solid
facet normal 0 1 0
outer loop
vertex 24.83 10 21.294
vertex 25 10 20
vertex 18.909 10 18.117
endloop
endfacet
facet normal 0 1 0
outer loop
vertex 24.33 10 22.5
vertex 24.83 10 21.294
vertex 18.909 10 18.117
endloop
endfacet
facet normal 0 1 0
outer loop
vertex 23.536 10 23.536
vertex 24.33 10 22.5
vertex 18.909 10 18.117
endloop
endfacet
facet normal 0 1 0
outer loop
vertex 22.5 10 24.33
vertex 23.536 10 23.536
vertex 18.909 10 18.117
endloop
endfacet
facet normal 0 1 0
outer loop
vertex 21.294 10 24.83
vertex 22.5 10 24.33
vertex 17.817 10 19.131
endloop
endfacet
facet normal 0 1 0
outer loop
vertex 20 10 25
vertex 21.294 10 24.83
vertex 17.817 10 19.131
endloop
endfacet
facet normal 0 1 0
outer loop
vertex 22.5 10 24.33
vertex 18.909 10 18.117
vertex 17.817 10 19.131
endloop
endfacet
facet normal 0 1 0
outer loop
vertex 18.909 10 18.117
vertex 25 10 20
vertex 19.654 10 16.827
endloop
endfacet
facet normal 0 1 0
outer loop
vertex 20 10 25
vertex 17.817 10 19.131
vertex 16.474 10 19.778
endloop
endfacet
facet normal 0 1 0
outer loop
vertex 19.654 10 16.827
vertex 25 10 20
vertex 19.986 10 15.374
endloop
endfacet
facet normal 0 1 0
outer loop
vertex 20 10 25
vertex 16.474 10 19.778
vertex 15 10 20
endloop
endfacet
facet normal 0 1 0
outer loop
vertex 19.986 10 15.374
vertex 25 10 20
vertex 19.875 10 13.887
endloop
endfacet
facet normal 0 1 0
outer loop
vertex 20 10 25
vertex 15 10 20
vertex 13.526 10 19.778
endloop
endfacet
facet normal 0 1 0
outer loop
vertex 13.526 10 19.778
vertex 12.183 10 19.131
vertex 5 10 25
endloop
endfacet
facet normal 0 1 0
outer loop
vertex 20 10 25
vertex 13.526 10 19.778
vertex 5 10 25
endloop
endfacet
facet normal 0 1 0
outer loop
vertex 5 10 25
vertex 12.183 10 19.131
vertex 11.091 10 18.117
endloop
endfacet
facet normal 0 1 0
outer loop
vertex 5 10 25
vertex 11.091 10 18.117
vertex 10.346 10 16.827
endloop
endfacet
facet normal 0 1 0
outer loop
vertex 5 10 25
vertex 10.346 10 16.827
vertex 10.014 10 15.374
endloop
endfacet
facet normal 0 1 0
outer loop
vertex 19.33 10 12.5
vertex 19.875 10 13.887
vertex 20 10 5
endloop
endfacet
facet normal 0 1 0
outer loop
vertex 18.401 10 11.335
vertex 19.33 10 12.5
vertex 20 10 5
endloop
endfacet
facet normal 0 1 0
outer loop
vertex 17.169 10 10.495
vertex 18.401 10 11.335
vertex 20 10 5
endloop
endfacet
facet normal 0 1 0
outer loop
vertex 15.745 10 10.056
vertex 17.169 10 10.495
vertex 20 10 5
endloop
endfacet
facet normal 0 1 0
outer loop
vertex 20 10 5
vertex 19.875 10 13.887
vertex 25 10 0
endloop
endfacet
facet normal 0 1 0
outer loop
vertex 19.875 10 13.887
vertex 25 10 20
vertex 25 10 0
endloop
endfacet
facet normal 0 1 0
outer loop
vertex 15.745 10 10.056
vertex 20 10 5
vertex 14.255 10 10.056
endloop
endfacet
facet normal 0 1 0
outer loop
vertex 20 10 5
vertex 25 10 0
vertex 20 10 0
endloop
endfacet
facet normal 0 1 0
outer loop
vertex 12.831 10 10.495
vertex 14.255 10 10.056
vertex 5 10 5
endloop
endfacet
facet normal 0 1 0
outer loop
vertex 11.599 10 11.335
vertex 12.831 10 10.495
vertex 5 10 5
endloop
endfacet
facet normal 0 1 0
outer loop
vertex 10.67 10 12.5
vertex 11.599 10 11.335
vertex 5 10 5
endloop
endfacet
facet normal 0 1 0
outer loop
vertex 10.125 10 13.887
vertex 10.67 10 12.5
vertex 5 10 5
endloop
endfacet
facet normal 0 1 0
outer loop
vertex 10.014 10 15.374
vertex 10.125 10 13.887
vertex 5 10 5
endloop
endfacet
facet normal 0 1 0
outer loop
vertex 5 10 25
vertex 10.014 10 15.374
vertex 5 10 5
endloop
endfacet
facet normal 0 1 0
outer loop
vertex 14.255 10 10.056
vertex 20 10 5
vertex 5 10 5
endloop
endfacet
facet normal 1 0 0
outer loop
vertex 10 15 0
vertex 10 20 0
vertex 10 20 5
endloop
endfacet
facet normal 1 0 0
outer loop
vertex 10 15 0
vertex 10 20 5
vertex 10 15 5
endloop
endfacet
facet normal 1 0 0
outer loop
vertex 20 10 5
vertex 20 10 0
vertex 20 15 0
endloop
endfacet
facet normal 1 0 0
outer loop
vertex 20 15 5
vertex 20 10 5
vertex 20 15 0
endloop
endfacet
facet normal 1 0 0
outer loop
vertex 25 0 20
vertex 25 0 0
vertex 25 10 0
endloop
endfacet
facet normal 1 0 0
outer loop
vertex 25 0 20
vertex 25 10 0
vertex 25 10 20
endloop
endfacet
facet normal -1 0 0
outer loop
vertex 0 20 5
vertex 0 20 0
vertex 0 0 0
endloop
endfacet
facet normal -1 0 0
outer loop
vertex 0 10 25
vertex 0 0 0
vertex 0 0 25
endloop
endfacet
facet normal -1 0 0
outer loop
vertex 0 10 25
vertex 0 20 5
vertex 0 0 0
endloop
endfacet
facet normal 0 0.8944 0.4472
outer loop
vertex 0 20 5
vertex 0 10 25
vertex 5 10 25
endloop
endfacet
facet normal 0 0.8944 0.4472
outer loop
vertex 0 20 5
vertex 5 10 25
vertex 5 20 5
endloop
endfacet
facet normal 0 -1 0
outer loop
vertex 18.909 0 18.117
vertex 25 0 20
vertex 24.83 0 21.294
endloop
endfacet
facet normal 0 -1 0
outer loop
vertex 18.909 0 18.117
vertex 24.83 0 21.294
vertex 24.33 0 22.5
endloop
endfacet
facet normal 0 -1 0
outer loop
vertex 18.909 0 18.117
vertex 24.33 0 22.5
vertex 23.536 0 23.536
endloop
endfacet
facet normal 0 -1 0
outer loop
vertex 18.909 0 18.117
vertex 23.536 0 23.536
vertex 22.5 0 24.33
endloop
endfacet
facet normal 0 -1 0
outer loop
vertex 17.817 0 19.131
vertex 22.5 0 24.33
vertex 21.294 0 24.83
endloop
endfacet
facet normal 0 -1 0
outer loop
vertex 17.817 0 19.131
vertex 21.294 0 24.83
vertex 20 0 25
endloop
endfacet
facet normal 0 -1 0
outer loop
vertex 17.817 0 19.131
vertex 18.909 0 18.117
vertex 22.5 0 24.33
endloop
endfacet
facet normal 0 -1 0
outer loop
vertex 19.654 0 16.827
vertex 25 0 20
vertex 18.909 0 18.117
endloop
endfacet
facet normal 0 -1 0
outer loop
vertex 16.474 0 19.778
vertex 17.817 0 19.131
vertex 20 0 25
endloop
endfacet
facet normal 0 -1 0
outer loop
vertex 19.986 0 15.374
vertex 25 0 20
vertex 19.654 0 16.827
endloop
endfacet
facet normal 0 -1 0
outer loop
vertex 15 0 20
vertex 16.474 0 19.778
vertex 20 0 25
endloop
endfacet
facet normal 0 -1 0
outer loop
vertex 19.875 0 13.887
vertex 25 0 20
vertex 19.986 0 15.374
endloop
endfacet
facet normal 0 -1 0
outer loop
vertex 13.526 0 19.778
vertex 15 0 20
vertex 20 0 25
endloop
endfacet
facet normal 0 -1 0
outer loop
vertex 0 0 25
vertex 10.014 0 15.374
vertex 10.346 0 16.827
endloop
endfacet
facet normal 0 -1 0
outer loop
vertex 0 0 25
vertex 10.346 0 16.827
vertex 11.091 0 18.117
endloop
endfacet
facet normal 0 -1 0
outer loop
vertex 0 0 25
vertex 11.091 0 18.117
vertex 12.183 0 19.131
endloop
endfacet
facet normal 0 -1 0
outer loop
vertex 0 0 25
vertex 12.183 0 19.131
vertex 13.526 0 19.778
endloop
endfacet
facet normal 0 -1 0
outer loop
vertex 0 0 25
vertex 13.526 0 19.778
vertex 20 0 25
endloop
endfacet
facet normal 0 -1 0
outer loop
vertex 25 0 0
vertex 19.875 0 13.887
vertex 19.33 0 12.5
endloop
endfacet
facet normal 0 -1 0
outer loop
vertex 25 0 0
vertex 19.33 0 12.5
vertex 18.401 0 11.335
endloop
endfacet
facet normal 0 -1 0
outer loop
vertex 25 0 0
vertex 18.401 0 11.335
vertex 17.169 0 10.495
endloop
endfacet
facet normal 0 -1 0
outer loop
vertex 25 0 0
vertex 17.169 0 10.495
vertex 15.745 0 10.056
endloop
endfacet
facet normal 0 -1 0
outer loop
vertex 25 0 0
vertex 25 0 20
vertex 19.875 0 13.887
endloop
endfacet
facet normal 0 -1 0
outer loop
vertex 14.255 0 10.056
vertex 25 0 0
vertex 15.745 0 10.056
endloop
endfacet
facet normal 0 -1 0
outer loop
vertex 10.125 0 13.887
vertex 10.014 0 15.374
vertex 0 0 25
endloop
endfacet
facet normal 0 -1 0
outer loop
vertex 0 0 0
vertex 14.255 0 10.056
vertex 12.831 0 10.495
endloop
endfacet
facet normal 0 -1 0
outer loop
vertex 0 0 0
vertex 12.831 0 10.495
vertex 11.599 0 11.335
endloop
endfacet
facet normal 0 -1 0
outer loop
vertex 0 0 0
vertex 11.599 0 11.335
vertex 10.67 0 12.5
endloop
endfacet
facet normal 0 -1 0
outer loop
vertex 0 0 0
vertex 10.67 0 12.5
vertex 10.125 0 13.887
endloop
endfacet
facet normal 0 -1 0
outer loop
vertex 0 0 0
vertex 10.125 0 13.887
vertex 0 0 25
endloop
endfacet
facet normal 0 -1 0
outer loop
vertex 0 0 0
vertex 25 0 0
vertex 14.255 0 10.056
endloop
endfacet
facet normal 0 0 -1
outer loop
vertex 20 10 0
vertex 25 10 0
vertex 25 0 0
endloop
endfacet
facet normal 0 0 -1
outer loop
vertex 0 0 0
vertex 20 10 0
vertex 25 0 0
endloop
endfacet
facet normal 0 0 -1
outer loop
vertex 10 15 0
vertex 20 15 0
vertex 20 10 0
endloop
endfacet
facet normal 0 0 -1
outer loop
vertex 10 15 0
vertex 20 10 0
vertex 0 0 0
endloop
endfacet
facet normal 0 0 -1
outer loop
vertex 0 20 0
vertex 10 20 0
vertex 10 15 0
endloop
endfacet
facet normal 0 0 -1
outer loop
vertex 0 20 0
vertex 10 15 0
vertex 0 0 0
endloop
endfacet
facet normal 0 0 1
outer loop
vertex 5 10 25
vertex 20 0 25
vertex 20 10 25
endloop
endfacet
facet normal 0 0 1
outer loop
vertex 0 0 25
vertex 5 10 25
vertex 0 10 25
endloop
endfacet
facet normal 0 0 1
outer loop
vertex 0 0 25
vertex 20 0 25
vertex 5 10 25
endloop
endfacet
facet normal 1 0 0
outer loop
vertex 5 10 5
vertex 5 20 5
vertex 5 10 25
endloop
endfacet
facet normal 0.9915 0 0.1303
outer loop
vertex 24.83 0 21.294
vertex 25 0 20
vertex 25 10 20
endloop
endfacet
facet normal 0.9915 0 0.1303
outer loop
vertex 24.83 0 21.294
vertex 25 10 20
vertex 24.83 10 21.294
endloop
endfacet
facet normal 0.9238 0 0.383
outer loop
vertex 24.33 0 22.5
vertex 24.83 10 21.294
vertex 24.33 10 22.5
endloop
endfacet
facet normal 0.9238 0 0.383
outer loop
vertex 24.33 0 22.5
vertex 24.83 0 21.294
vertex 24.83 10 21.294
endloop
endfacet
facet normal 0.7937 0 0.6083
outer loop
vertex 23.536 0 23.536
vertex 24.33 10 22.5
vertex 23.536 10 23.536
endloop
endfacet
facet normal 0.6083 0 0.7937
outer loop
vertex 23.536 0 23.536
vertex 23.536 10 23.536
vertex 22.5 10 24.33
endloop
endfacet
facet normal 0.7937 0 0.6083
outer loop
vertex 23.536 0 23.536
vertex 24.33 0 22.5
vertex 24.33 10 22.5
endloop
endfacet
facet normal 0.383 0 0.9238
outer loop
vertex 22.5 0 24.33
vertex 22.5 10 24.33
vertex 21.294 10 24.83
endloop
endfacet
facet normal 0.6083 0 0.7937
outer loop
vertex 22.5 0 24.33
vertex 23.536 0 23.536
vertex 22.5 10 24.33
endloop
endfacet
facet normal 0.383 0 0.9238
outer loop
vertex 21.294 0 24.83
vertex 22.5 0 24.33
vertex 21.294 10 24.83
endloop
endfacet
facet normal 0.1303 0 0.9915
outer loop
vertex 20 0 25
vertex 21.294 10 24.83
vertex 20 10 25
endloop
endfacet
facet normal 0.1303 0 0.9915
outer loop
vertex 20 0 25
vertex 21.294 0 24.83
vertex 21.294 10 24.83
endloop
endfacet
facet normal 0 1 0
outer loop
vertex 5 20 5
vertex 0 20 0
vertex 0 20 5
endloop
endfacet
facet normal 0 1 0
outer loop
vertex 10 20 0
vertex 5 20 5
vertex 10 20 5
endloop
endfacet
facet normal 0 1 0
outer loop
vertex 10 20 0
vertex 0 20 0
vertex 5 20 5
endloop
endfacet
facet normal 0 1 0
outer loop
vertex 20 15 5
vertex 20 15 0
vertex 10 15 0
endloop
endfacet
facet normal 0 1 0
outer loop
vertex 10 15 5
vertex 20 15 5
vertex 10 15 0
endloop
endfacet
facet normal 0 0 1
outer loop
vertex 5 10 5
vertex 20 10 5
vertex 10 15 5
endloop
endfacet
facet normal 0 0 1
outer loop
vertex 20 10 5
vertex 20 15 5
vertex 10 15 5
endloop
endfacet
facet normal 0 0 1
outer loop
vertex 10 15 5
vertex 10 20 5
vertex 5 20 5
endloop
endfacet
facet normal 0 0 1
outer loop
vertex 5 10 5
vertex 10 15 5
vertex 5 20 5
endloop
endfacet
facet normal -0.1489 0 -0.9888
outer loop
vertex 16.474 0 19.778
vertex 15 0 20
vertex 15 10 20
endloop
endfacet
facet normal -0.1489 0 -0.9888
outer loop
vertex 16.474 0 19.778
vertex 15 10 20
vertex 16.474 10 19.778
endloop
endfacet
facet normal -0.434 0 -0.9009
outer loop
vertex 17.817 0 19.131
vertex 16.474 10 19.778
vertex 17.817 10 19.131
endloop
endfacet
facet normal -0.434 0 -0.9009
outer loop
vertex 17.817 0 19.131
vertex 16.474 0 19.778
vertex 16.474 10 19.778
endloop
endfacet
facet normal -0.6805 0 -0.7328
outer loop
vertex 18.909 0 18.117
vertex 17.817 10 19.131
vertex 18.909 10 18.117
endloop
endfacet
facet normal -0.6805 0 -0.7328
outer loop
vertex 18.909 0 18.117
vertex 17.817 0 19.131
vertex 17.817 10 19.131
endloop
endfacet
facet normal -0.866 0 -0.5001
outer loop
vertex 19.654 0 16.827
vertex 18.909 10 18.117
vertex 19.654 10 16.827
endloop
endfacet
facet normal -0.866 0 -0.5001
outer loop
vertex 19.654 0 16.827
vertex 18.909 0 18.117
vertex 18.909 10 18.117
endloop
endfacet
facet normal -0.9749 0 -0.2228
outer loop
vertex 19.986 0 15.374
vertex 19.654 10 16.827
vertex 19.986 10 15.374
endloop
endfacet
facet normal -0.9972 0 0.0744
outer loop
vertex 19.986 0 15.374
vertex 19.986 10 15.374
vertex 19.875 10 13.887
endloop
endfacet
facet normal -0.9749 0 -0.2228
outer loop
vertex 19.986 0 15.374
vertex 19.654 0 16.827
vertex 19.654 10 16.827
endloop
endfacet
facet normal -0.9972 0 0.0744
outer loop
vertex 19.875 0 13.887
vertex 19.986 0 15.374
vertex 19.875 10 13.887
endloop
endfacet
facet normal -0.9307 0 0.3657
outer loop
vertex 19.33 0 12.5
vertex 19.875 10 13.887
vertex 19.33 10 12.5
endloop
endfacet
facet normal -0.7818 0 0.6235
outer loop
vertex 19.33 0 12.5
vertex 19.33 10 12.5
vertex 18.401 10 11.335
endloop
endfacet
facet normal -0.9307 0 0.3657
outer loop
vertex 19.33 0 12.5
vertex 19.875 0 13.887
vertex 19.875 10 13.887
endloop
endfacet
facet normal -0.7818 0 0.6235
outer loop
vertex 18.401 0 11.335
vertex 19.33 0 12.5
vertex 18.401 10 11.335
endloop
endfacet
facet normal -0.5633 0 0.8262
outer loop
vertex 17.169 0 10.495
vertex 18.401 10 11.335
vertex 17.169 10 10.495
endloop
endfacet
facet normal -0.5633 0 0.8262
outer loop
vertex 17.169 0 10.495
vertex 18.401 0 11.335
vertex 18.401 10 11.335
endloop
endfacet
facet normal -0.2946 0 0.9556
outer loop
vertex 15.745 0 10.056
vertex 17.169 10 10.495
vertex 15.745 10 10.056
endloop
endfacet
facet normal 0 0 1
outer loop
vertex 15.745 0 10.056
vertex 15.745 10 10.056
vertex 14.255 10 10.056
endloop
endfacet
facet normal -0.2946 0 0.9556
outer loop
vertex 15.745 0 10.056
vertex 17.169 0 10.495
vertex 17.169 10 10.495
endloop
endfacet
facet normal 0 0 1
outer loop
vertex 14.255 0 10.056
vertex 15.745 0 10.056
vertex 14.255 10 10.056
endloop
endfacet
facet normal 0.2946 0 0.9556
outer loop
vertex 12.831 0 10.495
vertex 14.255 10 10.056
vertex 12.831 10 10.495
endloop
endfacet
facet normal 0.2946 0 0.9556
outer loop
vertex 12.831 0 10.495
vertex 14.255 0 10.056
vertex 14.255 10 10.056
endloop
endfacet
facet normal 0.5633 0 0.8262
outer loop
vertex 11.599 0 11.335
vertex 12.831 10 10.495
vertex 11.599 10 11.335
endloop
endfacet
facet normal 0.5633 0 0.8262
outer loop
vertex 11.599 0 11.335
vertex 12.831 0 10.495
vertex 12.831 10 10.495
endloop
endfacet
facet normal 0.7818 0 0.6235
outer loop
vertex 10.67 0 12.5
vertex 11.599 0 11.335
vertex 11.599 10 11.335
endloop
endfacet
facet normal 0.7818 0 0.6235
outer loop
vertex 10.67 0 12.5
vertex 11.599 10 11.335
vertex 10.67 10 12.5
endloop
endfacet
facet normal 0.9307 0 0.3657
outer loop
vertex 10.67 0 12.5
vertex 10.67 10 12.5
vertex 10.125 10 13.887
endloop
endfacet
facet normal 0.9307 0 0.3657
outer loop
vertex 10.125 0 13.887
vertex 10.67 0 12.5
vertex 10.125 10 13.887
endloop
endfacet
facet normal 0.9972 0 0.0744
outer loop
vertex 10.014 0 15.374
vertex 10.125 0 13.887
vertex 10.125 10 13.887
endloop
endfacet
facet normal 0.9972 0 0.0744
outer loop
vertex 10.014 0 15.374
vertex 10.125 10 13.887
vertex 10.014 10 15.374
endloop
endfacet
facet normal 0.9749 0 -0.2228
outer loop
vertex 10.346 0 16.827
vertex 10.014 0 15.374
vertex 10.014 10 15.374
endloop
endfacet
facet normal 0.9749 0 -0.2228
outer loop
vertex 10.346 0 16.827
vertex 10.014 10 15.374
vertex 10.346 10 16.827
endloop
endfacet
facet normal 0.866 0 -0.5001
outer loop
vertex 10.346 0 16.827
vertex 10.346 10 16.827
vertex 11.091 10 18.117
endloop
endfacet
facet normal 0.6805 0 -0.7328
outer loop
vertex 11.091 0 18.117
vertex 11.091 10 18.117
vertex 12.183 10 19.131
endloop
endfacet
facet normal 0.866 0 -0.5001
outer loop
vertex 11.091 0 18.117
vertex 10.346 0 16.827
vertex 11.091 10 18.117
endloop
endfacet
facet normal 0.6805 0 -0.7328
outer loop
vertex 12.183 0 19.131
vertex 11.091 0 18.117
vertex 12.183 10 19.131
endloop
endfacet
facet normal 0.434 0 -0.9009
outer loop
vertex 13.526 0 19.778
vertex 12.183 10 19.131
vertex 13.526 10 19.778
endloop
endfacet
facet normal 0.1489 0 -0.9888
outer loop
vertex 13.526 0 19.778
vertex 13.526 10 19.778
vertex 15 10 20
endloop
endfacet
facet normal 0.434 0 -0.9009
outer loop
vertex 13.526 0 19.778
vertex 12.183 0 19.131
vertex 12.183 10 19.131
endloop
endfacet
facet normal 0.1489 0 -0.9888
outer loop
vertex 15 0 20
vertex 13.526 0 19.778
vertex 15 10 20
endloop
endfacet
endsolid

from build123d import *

# Parameters (mm, degrees)
SKETCH_1_R      = 5
EXTRUDE_1_DEPTH = 10
SKETCH_2_W      = 10
SKETCH_2_H      = 5
EXTRUDE_2_DEPTH = 5
EXTRUDE_3_DEPTH = 5


with BuildPart() as part:
    # 草圖1 → 填料-伸長1 (new body)
    with BuildSketch(Plane(origin=(0, 0, 0), x_dir=(1, 0, 0), z_dir=(0, 1, 0))):
        with BuildLine():
            Line((0, 0), (25, 0))
            Line((25, 0), (25, -20))
            ThreePointArc((25, -20), (23.535533906, -23.535533906), (20, -25))
            Line((20, -25), (0, -25))
            Line((0, -25), (0, 0))
        make_face()
        with Locations(Location((15, -15, 0), (0, 0, 270))):
            Circle(SKETCH_1_R, mode=Mode.SUBTRACT)
    extrude(amount=EXTRUDE_1_DEPTH)

    # 草圖2 → 填料-伸長2 (add)
    with BuildSketch(Plane(origin=(0, 0, 0), x_dir=(-1, 0, 0), z_dir=(0, 0, -1))):
        Polygon((-10, 10), (0, 10), (0, 20), (-10, 20), (-10, 15), align=None)
        with Locations((-15, 12.5)):
            Rectangle(SKETCH_2_W, SKETCH_2_H)
    extrude(amount=-EXTRUDE_2_DEPTH)

    # 草圖3 → 填料-伸長3 (add)
    with BuildSketch(Plane.ZY):
        Polygon((5, 20), (5, 10), (25, 10), align=None)
    extrude(amount=-EXTRUDE_3_DEPTH)


solid = part.part
